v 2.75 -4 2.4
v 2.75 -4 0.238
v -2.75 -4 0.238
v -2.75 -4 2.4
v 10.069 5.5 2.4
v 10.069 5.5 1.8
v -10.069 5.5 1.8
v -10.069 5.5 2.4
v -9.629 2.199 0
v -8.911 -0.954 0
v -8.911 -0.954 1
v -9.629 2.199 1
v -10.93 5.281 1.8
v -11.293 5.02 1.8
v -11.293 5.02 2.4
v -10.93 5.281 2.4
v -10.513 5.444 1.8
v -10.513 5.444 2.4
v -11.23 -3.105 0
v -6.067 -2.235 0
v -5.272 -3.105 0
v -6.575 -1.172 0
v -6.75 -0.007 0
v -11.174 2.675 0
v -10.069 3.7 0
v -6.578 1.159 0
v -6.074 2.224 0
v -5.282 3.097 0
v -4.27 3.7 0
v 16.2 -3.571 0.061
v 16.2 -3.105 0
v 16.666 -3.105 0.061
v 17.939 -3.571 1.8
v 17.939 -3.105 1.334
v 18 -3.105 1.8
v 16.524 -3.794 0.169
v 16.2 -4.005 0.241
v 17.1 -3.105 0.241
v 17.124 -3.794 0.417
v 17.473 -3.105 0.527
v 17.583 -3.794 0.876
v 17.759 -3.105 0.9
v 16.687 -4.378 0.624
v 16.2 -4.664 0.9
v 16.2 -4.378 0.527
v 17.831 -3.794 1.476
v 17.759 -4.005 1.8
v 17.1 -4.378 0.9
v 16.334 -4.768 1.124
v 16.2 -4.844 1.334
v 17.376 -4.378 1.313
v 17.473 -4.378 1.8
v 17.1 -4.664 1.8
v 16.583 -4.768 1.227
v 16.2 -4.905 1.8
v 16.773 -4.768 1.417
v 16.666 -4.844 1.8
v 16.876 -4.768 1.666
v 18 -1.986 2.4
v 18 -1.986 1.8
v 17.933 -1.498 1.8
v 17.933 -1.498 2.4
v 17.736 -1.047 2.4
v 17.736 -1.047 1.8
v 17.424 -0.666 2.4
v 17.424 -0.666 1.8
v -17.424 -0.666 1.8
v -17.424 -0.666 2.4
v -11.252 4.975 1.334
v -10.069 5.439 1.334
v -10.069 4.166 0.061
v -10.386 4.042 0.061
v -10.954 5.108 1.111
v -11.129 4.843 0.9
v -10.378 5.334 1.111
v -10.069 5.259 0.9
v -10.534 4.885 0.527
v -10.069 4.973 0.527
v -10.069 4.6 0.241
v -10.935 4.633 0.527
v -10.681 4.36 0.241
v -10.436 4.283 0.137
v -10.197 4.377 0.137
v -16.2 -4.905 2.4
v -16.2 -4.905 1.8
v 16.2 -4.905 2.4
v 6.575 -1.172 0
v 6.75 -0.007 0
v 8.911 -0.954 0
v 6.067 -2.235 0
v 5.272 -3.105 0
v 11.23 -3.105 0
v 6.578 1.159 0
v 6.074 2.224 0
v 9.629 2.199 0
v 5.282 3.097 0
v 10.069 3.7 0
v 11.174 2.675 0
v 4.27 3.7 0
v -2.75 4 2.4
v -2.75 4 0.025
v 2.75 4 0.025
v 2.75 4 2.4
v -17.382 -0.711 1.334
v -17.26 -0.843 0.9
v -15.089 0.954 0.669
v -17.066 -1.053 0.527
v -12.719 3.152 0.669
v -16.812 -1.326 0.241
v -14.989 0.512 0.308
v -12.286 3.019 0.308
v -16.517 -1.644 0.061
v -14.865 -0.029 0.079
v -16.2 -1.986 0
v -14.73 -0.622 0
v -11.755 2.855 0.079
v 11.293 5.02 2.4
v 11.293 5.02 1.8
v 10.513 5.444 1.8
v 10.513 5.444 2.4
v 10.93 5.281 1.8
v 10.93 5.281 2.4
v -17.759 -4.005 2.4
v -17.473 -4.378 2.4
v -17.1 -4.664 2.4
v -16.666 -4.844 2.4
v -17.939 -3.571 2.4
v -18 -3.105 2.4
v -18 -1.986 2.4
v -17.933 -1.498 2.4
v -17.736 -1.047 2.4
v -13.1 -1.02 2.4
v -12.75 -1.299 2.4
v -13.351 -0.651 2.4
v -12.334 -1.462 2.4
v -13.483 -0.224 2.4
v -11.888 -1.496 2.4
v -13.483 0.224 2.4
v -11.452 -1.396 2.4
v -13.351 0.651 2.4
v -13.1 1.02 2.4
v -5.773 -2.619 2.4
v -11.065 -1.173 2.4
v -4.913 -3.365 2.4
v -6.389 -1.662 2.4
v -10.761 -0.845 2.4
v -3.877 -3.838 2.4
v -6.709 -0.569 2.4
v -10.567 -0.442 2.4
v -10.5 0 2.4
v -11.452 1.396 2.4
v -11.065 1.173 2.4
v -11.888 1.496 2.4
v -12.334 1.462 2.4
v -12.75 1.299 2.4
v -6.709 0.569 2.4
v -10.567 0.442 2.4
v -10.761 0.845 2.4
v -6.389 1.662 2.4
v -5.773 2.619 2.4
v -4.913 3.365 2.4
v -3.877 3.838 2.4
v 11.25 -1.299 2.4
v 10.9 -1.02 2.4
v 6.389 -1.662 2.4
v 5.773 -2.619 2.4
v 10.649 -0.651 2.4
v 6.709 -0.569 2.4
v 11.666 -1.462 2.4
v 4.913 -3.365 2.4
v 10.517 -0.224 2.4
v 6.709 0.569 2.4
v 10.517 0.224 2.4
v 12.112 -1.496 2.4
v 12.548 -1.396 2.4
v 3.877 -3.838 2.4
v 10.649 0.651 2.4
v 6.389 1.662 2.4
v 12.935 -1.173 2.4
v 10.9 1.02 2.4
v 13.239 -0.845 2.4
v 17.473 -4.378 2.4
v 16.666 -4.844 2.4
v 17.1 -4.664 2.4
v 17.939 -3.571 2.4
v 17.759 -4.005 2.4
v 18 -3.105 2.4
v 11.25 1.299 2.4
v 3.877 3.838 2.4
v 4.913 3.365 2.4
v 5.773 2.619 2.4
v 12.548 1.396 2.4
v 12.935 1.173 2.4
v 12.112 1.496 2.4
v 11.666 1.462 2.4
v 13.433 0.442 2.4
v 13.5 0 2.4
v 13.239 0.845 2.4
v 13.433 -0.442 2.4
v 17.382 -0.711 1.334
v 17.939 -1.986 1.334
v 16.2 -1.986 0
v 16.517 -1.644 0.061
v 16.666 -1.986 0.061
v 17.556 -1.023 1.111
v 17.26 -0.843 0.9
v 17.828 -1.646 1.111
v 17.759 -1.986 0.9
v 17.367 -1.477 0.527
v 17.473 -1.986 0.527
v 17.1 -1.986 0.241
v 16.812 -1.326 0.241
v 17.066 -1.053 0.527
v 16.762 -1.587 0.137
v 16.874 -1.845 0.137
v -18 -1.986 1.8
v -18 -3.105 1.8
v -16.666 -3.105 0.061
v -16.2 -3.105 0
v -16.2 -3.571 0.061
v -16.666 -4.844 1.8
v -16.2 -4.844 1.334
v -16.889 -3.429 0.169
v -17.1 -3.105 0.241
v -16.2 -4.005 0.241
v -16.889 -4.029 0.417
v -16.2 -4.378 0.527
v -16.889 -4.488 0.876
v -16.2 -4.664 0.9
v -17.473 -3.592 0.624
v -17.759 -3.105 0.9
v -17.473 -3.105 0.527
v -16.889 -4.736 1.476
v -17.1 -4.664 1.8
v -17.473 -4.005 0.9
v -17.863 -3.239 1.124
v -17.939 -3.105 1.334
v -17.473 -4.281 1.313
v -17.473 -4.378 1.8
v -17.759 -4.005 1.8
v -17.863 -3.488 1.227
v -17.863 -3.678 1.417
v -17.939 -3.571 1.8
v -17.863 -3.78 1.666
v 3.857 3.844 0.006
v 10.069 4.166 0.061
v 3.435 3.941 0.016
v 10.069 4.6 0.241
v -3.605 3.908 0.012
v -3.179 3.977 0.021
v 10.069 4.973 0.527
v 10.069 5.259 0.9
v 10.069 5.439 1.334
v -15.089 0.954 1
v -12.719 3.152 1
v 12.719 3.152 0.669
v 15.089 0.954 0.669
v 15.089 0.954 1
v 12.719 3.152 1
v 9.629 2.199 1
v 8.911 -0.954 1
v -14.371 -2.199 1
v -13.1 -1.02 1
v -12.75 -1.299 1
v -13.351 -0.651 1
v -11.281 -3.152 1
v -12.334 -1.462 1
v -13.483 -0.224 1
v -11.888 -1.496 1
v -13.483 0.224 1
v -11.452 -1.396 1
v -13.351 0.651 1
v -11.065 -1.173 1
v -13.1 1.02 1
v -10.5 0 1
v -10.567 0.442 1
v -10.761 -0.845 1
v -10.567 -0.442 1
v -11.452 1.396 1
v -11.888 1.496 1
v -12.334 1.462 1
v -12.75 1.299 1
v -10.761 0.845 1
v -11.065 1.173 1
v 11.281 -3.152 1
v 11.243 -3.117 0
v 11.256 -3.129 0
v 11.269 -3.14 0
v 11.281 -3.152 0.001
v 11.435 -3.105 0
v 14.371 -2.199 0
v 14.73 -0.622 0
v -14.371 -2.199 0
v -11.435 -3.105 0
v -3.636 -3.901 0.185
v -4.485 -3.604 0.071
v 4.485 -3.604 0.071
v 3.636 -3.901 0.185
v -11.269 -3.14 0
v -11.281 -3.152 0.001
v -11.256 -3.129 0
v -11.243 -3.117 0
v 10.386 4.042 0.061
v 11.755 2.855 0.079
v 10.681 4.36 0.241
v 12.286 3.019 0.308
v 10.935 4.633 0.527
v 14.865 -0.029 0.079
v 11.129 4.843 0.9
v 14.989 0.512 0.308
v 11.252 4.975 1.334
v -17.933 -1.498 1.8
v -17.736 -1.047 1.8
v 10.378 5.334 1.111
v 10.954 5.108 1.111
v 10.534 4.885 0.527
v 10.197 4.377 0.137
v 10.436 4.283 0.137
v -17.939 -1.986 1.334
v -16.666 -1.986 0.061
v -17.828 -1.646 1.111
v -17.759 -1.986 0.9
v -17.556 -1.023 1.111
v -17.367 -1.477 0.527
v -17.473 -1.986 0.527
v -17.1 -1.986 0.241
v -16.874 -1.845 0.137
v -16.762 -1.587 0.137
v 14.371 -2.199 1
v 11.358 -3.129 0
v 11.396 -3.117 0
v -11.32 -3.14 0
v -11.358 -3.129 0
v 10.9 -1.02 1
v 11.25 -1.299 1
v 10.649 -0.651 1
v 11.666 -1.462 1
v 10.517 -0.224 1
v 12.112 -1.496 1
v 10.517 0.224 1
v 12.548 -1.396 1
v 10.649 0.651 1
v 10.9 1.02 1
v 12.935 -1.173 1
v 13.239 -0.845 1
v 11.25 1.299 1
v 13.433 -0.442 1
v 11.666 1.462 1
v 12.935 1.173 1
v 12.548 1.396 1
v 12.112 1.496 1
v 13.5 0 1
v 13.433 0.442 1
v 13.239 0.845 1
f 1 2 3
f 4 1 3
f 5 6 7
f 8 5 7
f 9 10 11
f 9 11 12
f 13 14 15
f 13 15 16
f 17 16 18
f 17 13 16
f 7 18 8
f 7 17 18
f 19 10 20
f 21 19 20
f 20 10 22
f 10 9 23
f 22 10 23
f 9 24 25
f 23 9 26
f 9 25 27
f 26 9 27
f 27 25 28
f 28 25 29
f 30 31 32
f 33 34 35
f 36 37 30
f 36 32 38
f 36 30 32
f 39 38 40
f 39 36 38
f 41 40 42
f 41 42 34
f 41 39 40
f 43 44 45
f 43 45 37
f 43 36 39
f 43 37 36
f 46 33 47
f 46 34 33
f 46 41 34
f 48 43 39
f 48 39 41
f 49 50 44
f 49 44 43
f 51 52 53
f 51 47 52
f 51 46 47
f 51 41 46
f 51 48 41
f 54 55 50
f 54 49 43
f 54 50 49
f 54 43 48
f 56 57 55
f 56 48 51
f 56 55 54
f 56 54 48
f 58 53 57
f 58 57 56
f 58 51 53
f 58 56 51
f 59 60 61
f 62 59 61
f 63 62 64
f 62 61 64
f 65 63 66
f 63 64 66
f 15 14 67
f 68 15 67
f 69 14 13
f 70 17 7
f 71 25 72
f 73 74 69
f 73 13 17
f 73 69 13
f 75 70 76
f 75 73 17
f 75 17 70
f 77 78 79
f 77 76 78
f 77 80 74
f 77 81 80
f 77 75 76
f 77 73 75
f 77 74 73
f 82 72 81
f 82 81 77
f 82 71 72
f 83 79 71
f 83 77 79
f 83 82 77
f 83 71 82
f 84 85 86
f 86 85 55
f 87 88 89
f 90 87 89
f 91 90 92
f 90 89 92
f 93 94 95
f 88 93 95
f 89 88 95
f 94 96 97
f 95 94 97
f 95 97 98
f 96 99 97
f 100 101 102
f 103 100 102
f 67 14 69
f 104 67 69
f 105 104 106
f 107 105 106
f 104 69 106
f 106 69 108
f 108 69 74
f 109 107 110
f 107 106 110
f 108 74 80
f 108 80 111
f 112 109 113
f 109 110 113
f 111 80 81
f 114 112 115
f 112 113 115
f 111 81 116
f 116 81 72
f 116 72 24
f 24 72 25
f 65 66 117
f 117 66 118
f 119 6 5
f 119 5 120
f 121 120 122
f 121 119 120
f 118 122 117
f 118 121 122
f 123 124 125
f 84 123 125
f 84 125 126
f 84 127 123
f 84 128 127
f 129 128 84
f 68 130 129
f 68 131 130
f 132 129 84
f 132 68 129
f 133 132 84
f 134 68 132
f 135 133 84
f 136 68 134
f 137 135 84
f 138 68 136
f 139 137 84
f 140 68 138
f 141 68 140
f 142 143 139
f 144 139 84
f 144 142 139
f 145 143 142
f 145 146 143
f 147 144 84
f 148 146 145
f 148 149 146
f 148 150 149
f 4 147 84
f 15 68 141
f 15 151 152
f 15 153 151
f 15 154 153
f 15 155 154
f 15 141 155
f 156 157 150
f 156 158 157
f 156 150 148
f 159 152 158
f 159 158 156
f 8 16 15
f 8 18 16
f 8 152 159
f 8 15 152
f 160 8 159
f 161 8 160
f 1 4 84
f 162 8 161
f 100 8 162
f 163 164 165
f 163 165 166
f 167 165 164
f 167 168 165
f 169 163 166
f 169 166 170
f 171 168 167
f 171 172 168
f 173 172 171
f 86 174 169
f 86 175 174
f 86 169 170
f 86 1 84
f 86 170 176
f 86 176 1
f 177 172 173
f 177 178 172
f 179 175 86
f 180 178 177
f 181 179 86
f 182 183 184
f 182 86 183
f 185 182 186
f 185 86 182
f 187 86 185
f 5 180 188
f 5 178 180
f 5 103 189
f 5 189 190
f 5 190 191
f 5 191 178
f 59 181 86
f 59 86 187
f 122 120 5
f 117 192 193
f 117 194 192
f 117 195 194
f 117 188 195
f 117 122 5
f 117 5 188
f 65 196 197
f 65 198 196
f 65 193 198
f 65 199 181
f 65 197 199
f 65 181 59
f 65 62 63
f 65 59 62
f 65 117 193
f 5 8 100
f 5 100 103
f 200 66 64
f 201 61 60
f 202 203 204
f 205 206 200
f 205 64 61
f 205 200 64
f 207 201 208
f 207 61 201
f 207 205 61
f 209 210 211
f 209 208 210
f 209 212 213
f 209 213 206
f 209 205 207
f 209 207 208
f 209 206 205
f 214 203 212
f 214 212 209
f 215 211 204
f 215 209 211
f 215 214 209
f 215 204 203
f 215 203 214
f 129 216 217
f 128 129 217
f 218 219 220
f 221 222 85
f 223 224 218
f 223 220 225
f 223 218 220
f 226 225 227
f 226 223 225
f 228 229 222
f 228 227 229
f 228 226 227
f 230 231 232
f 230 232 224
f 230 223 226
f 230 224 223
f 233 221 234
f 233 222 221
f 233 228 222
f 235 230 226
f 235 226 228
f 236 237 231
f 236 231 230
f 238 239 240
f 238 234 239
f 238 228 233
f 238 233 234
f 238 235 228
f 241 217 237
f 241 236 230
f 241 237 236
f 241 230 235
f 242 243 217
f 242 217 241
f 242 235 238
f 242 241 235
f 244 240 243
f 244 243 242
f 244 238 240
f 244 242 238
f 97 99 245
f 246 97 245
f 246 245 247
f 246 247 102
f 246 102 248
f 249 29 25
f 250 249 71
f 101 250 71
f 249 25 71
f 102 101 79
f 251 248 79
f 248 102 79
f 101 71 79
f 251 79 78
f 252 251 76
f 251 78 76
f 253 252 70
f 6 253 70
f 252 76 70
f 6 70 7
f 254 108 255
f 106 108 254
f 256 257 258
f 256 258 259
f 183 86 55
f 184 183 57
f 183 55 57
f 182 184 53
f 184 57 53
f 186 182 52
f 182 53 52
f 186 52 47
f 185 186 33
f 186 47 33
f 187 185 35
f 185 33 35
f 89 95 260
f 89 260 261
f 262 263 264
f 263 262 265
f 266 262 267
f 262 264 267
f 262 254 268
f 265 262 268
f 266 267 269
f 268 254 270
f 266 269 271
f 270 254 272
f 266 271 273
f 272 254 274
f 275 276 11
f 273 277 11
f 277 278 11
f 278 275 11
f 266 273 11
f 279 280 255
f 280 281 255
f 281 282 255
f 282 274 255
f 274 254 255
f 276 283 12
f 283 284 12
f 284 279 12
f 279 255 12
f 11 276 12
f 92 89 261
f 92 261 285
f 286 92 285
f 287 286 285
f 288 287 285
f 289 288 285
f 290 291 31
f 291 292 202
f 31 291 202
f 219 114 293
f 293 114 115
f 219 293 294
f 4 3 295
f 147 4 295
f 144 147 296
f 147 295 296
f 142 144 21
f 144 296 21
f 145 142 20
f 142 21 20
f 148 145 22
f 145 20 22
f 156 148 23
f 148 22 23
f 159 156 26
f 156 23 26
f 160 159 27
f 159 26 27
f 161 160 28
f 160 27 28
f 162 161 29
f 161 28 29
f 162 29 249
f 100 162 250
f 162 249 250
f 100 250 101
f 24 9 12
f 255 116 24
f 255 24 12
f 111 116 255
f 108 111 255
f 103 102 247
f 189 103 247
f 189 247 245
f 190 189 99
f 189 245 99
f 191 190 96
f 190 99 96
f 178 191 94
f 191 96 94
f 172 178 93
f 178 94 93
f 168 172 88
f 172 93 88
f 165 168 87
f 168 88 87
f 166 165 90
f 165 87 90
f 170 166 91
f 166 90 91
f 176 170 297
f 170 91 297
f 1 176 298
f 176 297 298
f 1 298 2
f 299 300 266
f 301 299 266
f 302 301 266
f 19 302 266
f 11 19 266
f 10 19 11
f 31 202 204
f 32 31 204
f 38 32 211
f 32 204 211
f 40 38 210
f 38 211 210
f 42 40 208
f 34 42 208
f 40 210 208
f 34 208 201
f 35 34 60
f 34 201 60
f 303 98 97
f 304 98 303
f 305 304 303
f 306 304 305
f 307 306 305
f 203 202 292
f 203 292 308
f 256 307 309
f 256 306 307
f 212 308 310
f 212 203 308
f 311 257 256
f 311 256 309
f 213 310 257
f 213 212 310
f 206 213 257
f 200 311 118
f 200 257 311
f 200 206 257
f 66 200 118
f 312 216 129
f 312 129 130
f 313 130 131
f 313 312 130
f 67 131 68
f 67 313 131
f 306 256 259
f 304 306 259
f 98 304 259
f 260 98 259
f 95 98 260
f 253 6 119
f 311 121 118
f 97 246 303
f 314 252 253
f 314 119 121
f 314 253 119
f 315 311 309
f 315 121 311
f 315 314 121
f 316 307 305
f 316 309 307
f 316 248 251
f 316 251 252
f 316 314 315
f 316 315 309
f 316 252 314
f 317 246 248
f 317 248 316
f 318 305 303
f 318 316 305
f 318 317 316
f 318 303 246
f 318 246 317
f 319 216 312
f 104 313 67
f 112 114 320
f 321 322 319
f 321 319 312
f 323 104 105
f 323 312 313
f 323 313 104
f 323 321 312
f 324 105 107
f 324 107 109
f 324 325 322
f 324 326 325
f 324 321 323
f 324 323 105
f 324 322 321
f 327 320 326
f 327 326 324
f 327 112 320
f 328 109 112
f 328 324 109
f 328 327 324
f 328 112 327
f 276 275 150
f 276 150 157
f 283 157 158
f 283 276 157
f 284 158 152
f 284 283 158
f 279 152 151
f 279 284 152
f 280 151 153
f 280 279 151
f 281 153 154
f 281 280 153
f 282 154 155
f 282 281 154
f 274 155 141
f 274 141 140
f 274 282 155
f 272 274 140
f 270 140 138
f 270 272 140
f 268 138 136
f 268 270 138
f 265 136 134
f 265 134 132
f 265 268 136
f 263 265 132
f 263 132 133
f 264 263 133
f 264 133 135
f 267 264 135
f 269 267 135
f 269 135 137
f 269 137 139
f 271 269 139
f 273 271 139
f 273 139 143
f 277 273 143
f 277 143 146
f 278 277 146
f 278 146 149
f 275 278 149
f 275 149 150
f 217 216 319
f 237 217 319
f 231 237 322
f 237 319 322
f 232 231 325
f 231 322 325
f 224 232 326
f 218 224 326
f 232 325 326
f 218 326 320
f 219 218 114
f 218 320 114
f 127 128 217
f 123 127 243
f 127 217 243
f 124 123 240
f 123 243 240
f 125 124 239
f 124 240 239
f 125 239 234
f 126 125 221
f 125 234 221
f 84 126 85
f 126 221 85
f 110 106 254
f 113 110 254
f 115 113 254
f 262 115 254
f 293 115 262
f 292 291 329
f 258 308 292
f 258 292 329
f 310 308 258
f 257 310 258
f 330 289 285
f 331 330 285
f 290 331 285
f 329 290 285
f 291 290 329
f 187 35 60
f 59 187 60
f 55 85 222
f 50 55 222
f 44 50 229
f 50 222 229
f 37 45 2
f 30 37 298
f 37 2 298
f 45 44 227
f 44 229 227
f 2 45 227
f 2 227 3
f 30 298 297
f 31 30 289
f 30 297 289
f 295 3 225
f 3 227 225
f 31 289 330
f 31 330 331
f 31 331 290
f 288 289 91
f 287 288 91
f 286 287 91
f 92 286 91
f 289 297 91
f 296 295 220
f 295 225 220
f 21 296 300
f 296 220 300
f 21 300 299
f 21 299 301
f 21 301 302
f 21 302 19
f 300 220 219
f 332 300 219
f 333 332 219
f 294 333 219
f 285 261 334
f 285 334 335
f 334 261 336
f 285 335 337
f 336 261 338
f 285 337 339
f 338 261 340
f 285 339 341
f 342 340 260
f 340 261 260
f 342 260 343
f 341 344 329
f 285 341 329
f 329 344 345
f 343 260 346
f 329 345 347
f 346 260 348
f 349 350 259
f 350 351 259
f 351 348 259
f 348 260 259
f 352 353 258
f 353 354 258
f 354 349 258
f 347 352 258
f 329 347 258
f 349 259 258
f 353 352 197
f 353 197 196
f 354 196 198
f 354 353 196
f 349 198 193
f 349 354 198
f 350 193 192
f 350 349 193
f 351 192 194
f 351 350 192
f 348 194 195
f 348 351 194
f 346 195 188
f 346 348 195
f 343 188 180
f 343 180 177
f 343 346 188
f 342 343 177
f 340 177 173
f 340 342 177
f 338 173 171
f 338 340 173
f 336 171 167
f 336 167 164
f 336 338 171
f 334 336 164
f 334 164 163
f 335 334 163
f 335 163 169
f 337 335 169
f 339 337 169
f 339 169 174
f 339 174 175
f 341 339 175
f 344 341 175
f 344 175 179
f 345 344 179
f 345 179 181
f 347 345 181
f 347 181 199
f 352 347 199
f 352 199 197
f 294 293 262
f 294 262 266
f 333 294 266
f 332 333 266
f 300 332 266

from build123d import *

# Parameters (mm, degrees)
F0_R         = 1.5
F1_DEPTH     = 2.4
F2_DEPTH     = 1
F3_T1_DEPTH  = 1.1190522621
F3_T3_DEPTH  = 32.4
F3_T5_DEPTH  = 20.138628613
F3_T7_DEPTH  = 2.365520331
F3_T9_DEPTH  = 8.3614446785
F3_T11_DEPTH = 8.3614446785
F3_T13_DEPTH = 5.1
F3_T15_DEPTH = 2.5639483811
F3_T20_DEPTH = 1.8
F3_S25_W     = 1.8
F3_S25_H     = 1.8
F3_T26_DEPTH = 1.8
F3_S31_W     = 1.8
F3_S31_H     = 1.8
F3_T32_DEPTH = 1.8
F3_T38_DEPTH = 1.8
F3_T44_DEPTH = 1.8
F3_T50_DEPTH = 1.8


# Not quite as in the source:
# - a fillet or chamfer that OpenCascade refuses, or shapes differently, is made with other operations: its cross-section is extruded or revolved along the edge and cut away or added


with BuildPart() as f1:
    # F0 (on Top) → F1 (new body)
    with BuildSketch(Plane.XY):
        Polygon((-18, -1.2002319389), (-18, -4.9048635534), (18, -4.9048635534), (18, -1.2002319389), (10.7755224389, 5.5), (-10.7755224389, 5.5), align=None)
        Polygon((-9.6294171928, 2.1985610038), (-8.9106989153, -0.9537044309), (-11.2812817225, -3.1522654347), (-14.3705828072, -2.1985610038), (-15.0893010847, 0.9537044309), (-12.7187182775, 3.1522654347), align=None, mode=Mode.SUBTRACT)
        with BuildLine():
            ThreePointArc((-2.75, -4), (-6.75, 0), (-2.75, 4))
            Line((-2.75, 4), (2.75, 4))
            ThreePointArc((2.75, 4), (6.75, 0), (2.75, -4))
            Line((2.75, -4), (-2.75, -4))
        make_face(mode=Mode.SUBTRACT)
        Polygon((9.6294171928, 2.1985610038), (12.7187182775, 3.1522654347), (15.0893010847, 0.9537044309), (14.3705828072, -2.1985610038), (11.2812817225, -3.1522654347), (8.9106989153, -0.9537044309), align=None, mode=Mode.SUBTRACT)
        Polygon((-11.2812817225, -3.1522654347), (-8.9106989153, -0.9537044309), (-9.6294171928, 2.1985610038), (-12.7187182775, 3.1522654347), (-15.0893010847, 0.9537044309), (-14.3705828072, -2.1985610038), align=None)
        with Locations((-12, 0)):
            Circle(F0_R, mode=Mode.SUBTRACT)
        Polygon((15.0893010847, 0.9537044309), (12.7187182775, 3.1522654347), (9.6294171928, 2.1985610038), (8.9106989153, -0.9537044309), (11.2812817225, -3.1522654347), (14.3705828072, -2.1985610038), align=None)
        with Locations((12, 0)):
            Circle(F0_R, mode=Mode.SUBTRACT)
    extrude(amount=F1_DEPTH)

    # F0 (on Top) → F2 (cut)
    with BuildSketch(Plane.XY):
        Polygon((15.0893010847, 0.9537044309), (12.7187182775, 3.1522654347), (9.6294171928, 2.1985610038), (8.9106989153, -0.9537044309), (11.2812817225, -3.1522654347), (14.3705828072, -2.1985610038), align=None)
        with Locations((12, 0)):
            Circle(F0_R, mode=Mode.SUBTRACT)
        Polygon((-11.2812817225, -3.1522654347), (-8.9106989153, -0.9537044309), (-9.6294171928, 2.1985610038), (-12.7187182775, 3.1522654347), (-15.0893010847, 0.9537044309), (-14.3705828072, -2.1985610038), align=None)
        with Locations((-12, 0)):
            Circle(F0_R, mode=Mode.SUBTRACT)
    extrude(amount=F2_DEPTH, mode=Mode.SUBTRACT)

    # F3: fillet of radius 1.8 on 12 edges, made by hand

    # F3_s2 → F3_t1 (cut)
    with BuildSketch(Plane.XZ.offset(1.9858112913)):
        with BuildLine():
            ThreePointArc((-18, 1.8), (-17.4727922061, 0.5272077939), (-16.2, 0))
            Line((-16.2, 0), (-18, 0))
            Line((-18, 0), (-18, 1.8))
        make_face()
        with BuildLine():
            ThreePointArc((16.2, 0), (17.4727922061, 0.5272077939), (18, 1.8))
            Line((18, 1.8), (18, 0))
            Line((18, 0), (16.2, 0))
        make_face()
    extrude(amount=F3_T1_DEPTH, mode=Mode.SUBTRACT)

    # F3_s4 → F3_t3 (cut)
    with BuildSketch(Plane.YZ.offset(-16.2)):
        with BuildLine():
            ThreePointArc((-4.9048635534, 1.8), (-4.3776557595, 0.5272077939), (-3.1048635534, 0))
            Line((-3.1048635534, 0), (-4.9048635534, 0))
            Line((-4.9048635534, 0), (-4.9048635534, 1.8))
        make_face()
    extrude(amount=F3_T3_DEPTH, mode=Mode.SUBTRACT)

    # F3_s6 → F3_t5 (cut)
    with BuildSketch(Plane.YZ.offset(-10.0693143065)):
        with BuildLine():
            ThreePointArc((3.7, 0), (4.9727922061, 0.5272077939), (5.5, 1.8))
            Line((5.5, 1.8), (5.5, 0))
            Line((5.5, 0), (3.7, 0))
        make_face()
    extrude(amount=F3_T5_DEPTH, mode=Mode.SUBTRACT)

    # F3_s8 → F3_t7 (cut)
    with BuildSketch(Plane.XY.offset(1.8)):
        with BuildLine():
            ThreePointArc((10.0693143065, 5.5), (10.7267347006, 5.3756486581), (11.2933205301, 5.0197760282))
            Line((11.2933205301, 5.0197760282), (10.7755224389, 5.5))
            Line((10.7755224389, 5.5), (10.0693143065, 5.5))
        make_face()
        with BuildLine():
            ThreePointArc((-11.2933205301, 5.0197760282), (-10.7267347006, 5.3756486581), (-10.0693143065, 5.5))
            Line((-10.0693143065, 5.5), (-10.7755224389, 5.5))
            Line((-10.7755224389, 5.5), (-11.2933205301, 5.0197760282))
        make_face()
    extrude(amount=F3_T7_DEPTH, mode=Mode.SUBTRACT)

    # F3_s10 → F3_t9 (cut)
    with BuildSketch(Plane(origin=(-3.5684530391, -3.3095075488, 0), x_dir=(0, 0, 1), z_dir=(-0.7332089046, -0.6800034575, 0))):
        with BuildLine():
            ThreePointArc((1.8, 11.3600414903), (0.5272077939, 10.8328336964), (0, 9.5600414903))
            Line((0, 9.5600414903), (0, 11.3600414903))
            Line((0, 11.3600414903), (1.8, 11.3600414903))
        make_face()
    extrude(amount=F3_T9_DEPTH, mode=Mode.SUBTRACT)

    # F3_s12 → F3_t11 (cut)
    with BuildSketch(Plane(origin=(9.6991387326, -8.9953188401, 0), x_dir=(0, 0, 1), z_dir=(-0.7332089046, 0.6800034575, 0))):
        with BuildLine():
            ThreePointArc((0, 9.5600414903), (0.5272077939, 10.8328336964), (1.8, 11.3600414903))
            Line((1.8, 11.3600414903), (0, 11.3600414903))
            Line((0, 11.3600414903), (0, 9.5600414903))
        make_face()
    extrude(amount=F3_T11_DEPTH, mode=Mode.SUBTRACT)

    # F3_s14 → F3_t13 (cut)
    with BuildSketch(Plane.XY.offset(1.8)):
        with BuildLine():
            ThreePointArc((-18, -3.1048635534), (-17.4727922061, -4.3776557595), (-16.2, -4.9048635534))
            Line((-16.2, -4.9048635534), (-18, -4.9048635534))
            Line((-18, -4.9048635534), (-18, -3.1048635534))
        make_face()
        with BuildLine():
            ThreePointArc((16.2, -4.9048635534), (17.4727922061, -4.3776557595), (18, -3.1048635534))
            Line((18, -3.1048635534), (18, -4.9048635534))
            Line((18, -4.9048635534), (16.2, -4.9048635534))
        make_face()
    extrude(amount=F3_T13_DEPTH, mode=Mode.SUBTRACT)

    # F3_s16 → F3_t15 (cut)
    with BuildSketch(Plane.XY.offset(1.8)):
        with BuildLine():
            ThreePointArc((-18, -1.9858112913), (-17.8497289478, -1.265815181), (-17.4240062235, -0.666035263))
            Line((-17.4240062235, -0.666035263), (-18, -1.2002319389))
            Line((-18, -1.2002319389), (-18, -1.9858112913))
        make_face()
        with BuildLine():
            ThreePointArc((18, -1.9858112913), (17.8497289478, -1.265815181), (17.4240062235, -0.666035263))
            Line((17.4240062235, -0.666035263), (18, -1.2002319389))
            Line((18, -1.2002319389), (18, -1.9858112913))
        make_face()
    extrude(amount=F3_T15_DEPTH, mode=Mode.SUBTRACT)


with BuildPart() as f3_tool18:
    # F3_s19 → F3_t20 (new body)
    with BuildSketch(Plane.XY.offset(1.8)):
        Polygon((-16.2, -1.9858112913), (-18, -1.9858112913), (-18, -1.2002319389), (-17.4240062235, -0.666035263), align=None)
    extrude(amount=-F3_T20_DEPTH)

    # F3_s21 → F3_t22 (revolve, cut)
    with BuildSketch(Plane(origin=(-16.2, -1.9858112913, 1.8), x_dir=(0.9165160821, -0.399997839, 0), z_dir=(0.399997839, 0.9165160821, 0))):
        with BuildLine():
            ThreePointArc((0, -1.8), (1.8, 0), (0, 1.8))
            Line((0, 1.8), (0, -1.8))
        make_face()
    revolve(axis=Axis((-16.2, -1.9858112913, 1.8), (0, 0, -1)), mode=Mode.SUBTRACT)


with BuildPart() as f1_1:
    add(f1.part)

    # F3_t17: cut F3_tool18
    add(f3_tool18.part, mode=Mode.SUBTRACT)


with BuildPart() as f3_tool24:
    # F3_s25 → F3_t26 (new body)
    with BuildSketch(Plane.YZ.offset(-16.2)):
        with Locations((-4.0048635534, 0.9)):
            Rectangle(F3_S25_W, F3_S25_H)
    extrude(amount=-F3_T26_DEPTH)

    # F3_s27 → F3_t28 (revolve, cut)
    with BuildSketch(Plane(origin=(-16.2, -3.1048635534, 1.8), x_dir=(0, 0.7071067812, 0.7071067812), z_dir=(0, -0.7071067812, 0.7071067812))):
        with BuildLine():
            ThreePointArc((0, -1.8), (1.8, 0), (0, 1.8))
            Line((0, 1.8), (0, -1.8))
        make_face()
    revolve(axis=Axis((-16.2, -3.1048635534, 1.8), (-1, 0, 0)), mode=Mode.SUBTRACT)


with BuildPart() as f1_2:
    add(f1_1.part)

    # F3_t23: cut F3_tool24
    add(f3_tool24.part, mode=Mode.SUBTRACT)


with BuildPart() as f3_tool30:
    # F3_s31 → F3_t32 (new body)
    with BuildSketch(Plane.XZ.offset(3.1048635534)):
        with Locations((17.1, 0.9)):
            Rectangle(F3_S31_W, F3_S31_H)
    extrude(amount=F3_T32_DEPTH)

    # F3_s33 → F3_t34 (revolve, cut)
    with BuildSketch(Plane(origin=(16.2, -3.1048635534, 1.8), x_dir=(-0.7071067812, 0, 0.7071067812), z_dir=(0.7071067812, 0, 0.7071067812))):
        with BuildLine():
            ThreePointArc((0, -1.8), (1.8, 0), (0, 1.8))
            Line((0, 1.8), (0, -1.8))
        make_face()
    revolve(axis=Axis((16.2, -3.1048635534, 1.8), (0, -1, 0)), mode=Mode.SUBTRACT)


with BuildPart() as f1_3:
    add(f1_2.part)

    # F3_t29: cut F3_tool30
    add(f3_tool30.part, mode=Mode.SUBTRACT)


with BuildPart() as f3_tool36:
    # F3_s37 → F3_t38 (new body)
    with BuildSketch(Plane.XY.offset(1.8)):
        Polygon((16.2, -1.9858112913), (18, -1.9858112913), (18, -1.2002319389), (17.4240062235, -0.666035263), align=None)
    extrude(amount=-F3_T38_DEPTH)

    # F3_s39 → F3_t40 (revolve, cut)
    with BuildSketch(Plane(origin=(16.2, -1.9858112913, 1.8), x_dir=(-0.9165160821, -0.399997839, 0), z_dir=(0.399997839, -0.9165160821, 0))):
        with BuildLine():
            ThreePointArc((0, -1.8), (1.8, 0), (0, 1.8))
            Line((0, 1.8), (0, -1.8))
        make_face()
    revolve(axis=Axis((16.2, -1.9858112913, 1.8), (0, 0, -1)), mode=Mode.SUBTRACT)


with BuildPart() as f1_4:
    add(f1_3.part)

    # F3_t35: cut F3_tool36
    add(f3_tool36.part, mode=Mode.SUBTRACT)


with BuildPart() as f3_tool42:
    # F3_s43 → F3_t44 (new body)
    with BuildSketch(Plane.XY.offset(1.8)):
        Polygon((10.0693143065, 3.7), (10.0693143065, 5.5), (10.7755224389, 5.5), (11.2933205301, 5.0197760282), align=None)
    extrude(amount=-F3_T44_DEPTH)

    # F3_s45 → F3_t46 (revolve, cut)
    with BuildSketch(Plane(origin=(10.0693143065, 3.7, 1.8), x_dir=(-0.3652335523, -0.9309159212, 0), z_dir=(0.9309159212, -0.3652335523, 0))):
        with BuildLine():
            ThreePointArc((0, -1.8), (1.8, 0), (0, 1.8))
            Line((0, 1.8), (0, -1.8))
        make_face()
    revolve(axis=Axis((10.0693143065, 3.7, 1.8), (0, 0, -1)), mode=Mode.SUBTRACT)


with BuildPart() as f1_5:
    add(f1_4.part)

    # F3_t41: cut F3_tool42
    add(f3_tool42.part, mode=Mode.SUBTRACT)


with BuildPart() as f3_tool48:
    # F3_s49 → F3_t50 (new body)
    with BuildSketch(Plane.XY.offset(1.8)):
        Polygon((-10.0693143065, 3.7), (-10.0693143065, 5.5), (-10.7755224389, 5.5), (-11.2933205301, 5.0197760282), align=None)
    extrude(amount=-F3_T50_DEPTH)

    # F3_s51 → F3_t52 (revolve, cut)
    with BuildSketch(Plane(origin=(-10.0693143065, 3.7, 1.8), x_dir=(0.3652335523, -0.9309159212, 0), z_dir=(0.9309159212, 0.3652335523, 0))):
        with BuildLine():
            ThreePointArc((0, -1.8), (1.8, 0), (0, 1.8))
            Line((0, 1.8), (0, -1.8))
        make_face()
    revolve(axis=Axis((-10.0693143065, 3.7, 1.8), (0, 0, -1)), mode=Mode.SUBTRACT)


with BuildPart() as f1_6:
    add(f1_5.part)

    # F3_t47: cut F3_tool48
    add(f3_tool48.part, mode=Mode.SUBTRACT)


solid = f1_6.part
